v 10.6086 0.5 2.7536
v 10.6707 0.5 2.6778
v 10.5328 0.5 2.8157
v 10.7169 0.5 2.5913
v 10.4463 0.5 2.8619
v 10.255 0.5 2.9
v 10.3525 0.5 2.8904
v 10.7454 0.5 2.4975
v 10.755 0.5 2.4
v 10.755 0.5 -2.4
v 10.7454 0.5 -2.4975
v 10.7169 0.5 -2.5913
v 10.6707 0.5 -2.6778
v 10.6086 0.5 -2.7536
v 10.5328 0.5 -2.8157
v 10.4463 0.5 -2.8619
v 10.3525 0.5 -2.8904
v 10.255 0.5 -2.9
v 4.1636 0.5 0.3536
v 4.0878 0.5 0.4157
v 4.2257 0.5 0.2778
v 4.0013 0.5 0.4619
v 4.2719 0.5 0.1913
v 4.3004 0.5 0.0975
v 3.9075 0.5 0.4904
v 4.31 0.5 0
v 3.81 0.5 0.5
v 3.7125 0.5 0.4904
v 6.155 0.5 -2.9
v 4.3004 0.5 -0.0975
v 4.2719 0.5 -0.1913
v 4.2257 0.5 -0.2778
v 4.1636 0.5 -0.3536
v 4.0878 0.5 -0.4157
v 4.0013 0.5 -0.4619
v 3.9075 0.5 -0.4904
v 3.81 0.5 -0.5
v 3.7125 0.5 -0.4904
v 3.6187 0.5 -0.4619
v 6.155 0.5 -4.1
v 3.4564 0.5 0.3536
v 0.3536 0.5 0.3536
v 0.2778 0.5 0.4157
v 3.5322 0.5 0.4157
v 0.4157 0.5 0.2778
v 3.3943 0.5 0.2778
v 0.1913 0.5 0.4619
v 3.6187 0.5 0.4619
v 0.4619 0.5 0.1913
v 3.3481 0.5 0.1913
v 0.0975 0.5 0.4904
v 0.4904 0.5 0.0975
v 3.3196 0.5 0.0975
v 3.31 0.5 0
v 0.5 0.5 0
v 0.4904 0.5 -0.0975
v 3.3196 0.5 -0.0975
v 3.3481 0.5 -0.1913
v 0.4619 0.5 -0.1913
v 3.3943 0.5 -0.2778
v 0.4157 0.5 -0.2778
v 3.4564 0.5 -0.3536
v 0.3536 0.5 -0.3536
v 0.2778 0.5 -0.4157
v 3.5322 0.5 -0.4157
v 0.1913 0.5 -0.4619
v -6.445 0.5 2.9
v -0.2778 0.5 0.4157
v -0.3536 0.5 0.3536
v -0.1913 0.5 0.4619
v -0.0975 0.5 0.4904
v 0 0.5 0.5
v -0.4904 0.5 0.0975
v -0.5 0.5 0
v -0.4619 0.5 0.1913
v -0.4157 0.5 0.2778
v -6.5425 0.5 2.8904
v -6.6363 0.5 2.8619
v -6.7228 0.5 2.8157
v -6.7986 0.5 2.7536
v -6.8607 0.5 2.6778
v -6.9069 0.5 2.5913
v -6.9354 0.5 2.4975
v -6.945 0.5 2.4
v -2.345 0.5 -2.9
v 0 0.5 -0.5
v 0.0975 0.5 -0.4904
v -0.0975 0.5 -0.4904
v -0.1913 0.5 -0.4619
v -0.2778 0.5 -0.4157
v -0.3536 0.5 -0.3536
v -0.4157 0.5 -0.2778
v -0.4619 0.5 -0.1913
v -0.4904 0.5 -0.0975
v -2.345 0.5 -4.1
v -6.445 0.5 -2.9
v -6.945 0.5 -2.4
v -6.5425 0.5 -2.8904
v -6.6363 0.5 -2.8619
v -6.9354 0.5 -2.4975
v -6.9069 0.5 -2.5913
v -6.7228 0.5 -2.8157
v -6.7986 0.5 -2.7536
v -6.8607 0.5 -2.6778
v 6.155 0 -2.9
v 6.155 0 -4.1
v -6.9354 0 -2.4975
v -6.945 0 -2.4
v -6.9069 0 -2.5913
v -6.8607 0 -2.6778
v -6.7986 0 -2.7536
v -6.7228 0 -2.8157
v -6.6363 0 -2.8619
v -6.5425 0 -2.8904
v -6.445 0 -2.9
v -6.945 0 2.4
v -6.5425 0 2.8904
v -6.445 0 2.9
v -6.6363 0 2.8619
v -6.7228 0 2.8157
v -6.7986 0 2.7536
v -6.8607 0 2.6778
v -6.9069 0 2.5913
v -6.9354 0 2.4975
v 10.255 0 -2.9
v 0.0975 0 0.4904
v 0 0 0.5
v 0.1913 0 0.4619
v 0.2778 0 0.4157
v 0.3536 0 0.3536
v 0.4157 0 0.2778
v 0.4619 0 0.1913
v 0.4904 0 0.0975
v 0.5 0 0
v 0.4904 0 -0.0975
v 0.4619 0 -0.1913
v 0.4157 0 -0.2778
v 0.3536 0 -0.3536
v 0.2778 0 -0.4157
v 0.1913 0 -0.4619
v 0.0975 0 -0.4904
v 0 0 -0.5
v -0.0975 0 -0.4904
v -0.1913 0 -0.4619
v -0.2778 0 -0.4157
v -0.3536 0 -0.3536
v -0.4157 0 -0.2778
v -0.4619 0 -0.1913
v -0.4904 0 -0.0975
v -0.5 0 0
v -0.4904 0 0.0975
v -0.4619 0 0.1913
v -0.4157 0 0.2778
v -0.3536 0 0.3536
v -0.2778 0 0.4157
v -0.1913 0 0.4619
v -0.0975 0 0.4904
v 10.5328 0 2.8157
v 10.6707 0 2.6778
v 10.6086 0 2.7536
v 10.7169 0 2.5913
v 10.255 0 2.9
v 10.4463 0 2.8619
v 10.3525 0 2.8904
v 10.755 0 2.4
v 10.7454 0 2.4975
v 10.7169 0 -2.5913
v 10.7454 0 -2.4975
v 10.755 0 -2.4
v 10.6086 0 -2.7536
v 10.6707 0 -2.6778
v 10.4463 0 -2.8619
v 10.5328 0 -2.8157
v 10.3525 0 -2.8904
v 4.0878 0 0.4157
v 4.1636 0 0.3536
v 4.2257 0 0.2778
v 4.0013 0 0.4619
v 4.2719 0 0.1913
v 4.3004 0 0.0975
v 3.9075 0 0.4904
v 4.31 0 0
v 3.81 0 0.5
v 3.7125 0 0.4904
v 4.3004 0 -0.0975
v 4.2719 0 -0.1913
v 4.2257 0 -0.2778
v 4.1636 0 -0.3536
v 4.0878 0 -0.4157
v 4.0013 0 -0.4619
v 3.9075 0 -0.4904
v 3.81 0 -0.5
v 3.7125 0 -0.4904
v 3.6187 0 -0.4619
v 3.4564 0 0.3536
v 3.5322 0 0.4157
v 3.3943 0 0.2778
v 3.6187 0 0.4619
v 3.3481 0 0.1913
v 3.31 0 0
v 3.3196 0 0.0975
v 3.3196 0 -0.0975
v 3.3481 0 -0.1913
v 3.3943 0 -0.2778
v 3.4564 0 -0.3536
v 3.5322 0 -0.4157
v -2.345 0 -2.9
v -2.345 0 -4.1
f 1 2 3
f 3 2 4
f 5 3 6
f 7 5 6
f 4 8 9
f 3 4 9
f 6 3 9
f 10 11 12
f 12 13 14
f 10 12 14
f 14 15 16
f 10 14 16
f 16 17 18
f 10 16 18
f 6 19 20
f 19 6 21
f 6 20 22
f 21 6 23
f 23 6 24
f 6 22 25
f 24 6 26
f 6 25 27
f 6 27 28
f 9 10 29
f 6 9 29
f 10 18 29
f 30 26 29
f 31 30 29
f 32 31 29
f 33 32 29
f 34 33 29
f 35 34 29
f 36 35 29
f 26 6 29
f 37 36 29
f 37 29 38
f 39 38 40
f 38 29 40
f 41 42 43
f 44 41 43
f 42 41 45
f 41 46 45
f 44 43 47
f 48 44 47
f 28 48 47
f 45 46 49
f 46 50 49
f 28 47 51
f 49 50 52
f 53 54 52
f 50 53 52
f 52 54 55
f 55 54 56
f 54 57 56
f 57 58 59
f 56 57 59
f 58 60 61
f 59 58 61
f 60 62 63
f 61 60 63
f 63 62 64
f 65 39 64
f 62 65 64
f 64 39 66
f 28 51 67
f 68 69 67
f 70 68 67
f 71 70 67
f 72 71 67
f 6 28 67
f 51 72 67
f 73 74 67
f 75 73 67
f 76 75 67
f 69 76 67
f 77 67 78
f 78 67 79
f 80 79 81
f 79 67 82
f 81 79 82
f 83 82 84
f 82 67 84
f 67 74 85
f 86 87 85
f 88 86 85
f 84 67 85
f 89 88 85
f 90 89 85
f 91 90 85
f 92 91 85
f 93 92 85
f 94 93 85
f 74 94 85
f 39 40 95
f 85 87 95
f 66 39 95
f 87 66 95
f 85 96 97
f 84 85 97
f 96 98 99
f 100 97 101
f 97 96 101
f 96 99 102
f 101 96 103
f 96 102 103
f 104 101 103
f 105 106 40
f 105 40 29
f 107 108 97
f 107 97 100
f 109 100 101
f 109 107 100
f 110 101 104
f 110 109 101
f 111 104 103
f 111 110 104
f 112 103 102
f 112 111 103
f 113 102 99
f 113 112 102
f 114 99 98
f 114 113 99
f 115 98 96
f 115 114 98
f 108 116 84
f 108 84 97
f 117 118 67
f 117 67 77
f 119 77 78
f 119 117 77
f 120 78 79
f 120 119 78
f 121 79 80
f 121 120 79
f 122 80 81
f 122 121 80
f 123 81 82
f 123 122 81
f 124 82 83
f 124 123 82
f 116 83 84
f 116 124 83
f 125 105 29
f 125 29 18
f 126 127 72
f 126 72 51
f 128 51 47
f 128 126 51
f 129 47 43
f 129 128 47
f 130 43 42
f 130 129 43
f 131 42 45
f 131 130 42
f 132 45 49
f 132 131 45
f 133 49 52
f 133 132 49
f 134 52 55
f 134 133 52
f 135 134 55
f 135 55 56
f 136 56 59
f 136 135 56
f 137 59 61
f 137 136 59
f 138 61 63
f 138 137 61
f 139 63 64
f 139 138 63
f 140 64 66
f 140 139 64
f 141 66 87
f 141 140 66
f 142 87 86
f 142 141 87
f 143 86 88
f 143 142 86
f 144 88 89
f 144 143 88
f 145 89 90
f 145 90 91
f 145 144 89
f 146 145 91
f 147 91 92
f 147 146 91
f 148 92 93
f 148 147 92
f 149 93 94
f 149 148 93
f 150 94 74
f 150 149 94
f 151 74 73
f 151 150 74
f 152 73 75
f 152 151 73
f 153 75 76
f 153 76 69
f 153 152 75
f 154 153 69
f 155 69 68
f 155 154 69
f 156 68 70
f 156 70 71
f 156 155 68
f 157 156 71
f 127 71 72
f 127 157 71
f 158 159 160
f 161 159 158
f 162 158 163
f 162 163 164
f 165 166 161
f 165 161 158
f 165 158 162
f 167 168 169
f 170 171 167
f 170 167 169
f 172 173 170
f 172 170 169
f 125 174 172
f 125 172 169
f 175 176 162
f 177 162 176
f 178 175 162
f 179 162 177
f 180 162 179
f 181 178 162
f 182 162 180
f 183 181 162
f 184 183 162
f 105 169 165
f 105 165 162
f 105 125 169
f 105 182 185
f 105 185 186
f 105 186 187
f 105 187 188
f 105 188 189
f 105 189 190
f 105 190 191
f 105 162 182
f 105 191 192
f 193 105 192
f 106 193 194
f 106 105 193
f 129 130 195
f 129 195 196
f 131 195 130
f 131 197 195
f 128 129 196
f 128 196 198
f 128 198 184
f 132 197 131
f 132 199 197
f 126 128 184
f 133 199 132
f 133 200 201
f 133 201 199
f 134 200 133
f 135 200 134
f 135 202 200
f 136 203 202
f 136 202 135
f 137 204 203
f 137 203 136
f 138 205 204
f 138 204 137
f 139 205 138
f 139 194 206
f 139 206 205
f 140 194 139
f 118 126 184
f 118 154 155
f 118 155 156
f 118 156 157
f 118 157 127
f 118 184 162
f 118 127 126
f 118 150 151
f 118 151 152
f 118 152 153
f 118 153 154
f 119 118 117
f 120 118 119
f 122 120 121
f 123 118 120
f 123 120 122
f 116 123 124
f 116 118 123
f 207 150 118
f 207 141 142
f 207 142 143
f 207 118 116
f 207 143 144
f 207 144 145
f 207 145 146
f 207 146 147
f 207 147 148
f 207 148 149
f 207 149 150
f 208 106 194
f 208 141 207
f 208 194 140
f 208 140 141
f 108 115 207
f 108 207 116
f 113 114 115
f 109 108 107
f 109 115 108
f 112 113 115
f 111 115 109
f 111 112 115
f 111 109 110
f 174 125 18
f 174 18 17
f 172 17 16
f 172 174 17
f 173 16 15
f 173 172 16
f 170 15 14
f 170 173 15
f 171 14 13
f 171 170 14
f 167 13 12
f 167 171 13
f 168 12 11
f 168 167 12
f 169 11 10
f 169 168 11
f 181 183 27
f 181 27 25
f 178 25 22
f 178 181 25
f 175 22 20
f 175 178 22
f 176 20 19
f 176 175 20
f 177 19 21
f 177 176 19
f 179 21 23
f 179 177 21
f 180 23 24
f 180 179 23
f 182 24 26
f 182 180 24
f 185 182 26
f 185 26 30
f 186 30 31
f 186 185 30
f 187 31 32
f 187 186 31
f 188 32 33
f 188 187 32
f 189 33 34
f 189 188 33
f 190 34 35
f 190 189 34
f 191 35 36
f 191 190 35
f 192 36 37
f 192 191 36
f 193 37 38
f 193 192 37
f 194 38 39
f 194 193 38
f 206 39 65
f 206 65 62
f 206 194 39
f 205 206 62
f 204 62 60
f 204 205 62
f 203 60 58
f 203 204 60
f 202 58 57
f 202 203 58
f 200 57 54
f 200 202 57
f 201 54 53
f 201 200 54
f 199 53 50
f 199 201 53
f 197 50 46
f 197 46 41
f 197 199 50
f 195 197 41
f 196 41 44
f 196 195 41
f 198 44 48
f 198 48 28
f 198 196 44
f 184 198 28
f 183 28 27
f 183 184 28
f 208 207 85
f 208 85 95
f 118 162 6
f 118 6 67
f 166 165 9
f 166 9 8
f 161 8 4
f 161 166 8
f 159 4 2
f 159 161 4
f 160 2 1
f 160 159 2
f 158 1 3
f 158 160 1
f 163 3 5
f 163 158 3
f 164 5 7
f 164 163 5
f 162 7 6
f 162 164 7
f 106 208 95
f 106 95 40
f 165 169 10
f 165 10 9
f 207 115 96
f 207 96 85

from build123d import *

# Parameters (mm, degrees)
SKETCH1_R           = 0.5
BOSS_EXTRUDE1_DEPTH = 0.5


with BuildPart() as part:
    # Sketch1 → Boss-Extrude1 (new body)
    with BuildSketch(Plane(origin=(0, 0, 0), x_dir=(1, 0, 0), z_dir=(0, 1, 0))):
        with BuildLine():
            Line((6.155, 2.9), (10.255, 2.9))
            ThreePointArc((10.255, 2.9), (10.608553391, 2.753553391), (10.755, 2.4))
            Line((10.755, 2.4), (10.755, -2.4))
            ThreePointArc((10.755, -2.4), (10.608553391, -2.753553391), (10.255, -2.9))
            Line((10.255, -2.9), (-6.445, -2.9))
            ThreePointArc((-6.445, -2.9), (-6.798553391, -2.753553391), (-6.945, -2.4))
            Line((-6.945, -2.4), (-6.945, 2.4))
            ThreePointArc((-6.945, 2.4), (-6.798553391, 2.753553391), (-6.445, 2.9))
            Line((-6.445, 2.9), (-2.345, 2.9))
            Line((-2.345, 2.9), (-2.345, 4.1))
            Line((-2.345, 4.1), (6.155, 4.1))
            Line((6.155, 4.1), (6.155, 2.9))
        make_face()
        with Locations(Location((0, 0, 0), (0, 0, 270))):
            Circle(SKETCH1_R, mode=Mode.SUBTRACT)
        with Locations(Location((3.81, 0, 0), (0, 0, 270))):
            Circle(SKETCH1_R, mode=Mode.SUBTRACT)
    extrude(amount=BOSS_EXTRUDE1_DEPTH)


solid = part.part
